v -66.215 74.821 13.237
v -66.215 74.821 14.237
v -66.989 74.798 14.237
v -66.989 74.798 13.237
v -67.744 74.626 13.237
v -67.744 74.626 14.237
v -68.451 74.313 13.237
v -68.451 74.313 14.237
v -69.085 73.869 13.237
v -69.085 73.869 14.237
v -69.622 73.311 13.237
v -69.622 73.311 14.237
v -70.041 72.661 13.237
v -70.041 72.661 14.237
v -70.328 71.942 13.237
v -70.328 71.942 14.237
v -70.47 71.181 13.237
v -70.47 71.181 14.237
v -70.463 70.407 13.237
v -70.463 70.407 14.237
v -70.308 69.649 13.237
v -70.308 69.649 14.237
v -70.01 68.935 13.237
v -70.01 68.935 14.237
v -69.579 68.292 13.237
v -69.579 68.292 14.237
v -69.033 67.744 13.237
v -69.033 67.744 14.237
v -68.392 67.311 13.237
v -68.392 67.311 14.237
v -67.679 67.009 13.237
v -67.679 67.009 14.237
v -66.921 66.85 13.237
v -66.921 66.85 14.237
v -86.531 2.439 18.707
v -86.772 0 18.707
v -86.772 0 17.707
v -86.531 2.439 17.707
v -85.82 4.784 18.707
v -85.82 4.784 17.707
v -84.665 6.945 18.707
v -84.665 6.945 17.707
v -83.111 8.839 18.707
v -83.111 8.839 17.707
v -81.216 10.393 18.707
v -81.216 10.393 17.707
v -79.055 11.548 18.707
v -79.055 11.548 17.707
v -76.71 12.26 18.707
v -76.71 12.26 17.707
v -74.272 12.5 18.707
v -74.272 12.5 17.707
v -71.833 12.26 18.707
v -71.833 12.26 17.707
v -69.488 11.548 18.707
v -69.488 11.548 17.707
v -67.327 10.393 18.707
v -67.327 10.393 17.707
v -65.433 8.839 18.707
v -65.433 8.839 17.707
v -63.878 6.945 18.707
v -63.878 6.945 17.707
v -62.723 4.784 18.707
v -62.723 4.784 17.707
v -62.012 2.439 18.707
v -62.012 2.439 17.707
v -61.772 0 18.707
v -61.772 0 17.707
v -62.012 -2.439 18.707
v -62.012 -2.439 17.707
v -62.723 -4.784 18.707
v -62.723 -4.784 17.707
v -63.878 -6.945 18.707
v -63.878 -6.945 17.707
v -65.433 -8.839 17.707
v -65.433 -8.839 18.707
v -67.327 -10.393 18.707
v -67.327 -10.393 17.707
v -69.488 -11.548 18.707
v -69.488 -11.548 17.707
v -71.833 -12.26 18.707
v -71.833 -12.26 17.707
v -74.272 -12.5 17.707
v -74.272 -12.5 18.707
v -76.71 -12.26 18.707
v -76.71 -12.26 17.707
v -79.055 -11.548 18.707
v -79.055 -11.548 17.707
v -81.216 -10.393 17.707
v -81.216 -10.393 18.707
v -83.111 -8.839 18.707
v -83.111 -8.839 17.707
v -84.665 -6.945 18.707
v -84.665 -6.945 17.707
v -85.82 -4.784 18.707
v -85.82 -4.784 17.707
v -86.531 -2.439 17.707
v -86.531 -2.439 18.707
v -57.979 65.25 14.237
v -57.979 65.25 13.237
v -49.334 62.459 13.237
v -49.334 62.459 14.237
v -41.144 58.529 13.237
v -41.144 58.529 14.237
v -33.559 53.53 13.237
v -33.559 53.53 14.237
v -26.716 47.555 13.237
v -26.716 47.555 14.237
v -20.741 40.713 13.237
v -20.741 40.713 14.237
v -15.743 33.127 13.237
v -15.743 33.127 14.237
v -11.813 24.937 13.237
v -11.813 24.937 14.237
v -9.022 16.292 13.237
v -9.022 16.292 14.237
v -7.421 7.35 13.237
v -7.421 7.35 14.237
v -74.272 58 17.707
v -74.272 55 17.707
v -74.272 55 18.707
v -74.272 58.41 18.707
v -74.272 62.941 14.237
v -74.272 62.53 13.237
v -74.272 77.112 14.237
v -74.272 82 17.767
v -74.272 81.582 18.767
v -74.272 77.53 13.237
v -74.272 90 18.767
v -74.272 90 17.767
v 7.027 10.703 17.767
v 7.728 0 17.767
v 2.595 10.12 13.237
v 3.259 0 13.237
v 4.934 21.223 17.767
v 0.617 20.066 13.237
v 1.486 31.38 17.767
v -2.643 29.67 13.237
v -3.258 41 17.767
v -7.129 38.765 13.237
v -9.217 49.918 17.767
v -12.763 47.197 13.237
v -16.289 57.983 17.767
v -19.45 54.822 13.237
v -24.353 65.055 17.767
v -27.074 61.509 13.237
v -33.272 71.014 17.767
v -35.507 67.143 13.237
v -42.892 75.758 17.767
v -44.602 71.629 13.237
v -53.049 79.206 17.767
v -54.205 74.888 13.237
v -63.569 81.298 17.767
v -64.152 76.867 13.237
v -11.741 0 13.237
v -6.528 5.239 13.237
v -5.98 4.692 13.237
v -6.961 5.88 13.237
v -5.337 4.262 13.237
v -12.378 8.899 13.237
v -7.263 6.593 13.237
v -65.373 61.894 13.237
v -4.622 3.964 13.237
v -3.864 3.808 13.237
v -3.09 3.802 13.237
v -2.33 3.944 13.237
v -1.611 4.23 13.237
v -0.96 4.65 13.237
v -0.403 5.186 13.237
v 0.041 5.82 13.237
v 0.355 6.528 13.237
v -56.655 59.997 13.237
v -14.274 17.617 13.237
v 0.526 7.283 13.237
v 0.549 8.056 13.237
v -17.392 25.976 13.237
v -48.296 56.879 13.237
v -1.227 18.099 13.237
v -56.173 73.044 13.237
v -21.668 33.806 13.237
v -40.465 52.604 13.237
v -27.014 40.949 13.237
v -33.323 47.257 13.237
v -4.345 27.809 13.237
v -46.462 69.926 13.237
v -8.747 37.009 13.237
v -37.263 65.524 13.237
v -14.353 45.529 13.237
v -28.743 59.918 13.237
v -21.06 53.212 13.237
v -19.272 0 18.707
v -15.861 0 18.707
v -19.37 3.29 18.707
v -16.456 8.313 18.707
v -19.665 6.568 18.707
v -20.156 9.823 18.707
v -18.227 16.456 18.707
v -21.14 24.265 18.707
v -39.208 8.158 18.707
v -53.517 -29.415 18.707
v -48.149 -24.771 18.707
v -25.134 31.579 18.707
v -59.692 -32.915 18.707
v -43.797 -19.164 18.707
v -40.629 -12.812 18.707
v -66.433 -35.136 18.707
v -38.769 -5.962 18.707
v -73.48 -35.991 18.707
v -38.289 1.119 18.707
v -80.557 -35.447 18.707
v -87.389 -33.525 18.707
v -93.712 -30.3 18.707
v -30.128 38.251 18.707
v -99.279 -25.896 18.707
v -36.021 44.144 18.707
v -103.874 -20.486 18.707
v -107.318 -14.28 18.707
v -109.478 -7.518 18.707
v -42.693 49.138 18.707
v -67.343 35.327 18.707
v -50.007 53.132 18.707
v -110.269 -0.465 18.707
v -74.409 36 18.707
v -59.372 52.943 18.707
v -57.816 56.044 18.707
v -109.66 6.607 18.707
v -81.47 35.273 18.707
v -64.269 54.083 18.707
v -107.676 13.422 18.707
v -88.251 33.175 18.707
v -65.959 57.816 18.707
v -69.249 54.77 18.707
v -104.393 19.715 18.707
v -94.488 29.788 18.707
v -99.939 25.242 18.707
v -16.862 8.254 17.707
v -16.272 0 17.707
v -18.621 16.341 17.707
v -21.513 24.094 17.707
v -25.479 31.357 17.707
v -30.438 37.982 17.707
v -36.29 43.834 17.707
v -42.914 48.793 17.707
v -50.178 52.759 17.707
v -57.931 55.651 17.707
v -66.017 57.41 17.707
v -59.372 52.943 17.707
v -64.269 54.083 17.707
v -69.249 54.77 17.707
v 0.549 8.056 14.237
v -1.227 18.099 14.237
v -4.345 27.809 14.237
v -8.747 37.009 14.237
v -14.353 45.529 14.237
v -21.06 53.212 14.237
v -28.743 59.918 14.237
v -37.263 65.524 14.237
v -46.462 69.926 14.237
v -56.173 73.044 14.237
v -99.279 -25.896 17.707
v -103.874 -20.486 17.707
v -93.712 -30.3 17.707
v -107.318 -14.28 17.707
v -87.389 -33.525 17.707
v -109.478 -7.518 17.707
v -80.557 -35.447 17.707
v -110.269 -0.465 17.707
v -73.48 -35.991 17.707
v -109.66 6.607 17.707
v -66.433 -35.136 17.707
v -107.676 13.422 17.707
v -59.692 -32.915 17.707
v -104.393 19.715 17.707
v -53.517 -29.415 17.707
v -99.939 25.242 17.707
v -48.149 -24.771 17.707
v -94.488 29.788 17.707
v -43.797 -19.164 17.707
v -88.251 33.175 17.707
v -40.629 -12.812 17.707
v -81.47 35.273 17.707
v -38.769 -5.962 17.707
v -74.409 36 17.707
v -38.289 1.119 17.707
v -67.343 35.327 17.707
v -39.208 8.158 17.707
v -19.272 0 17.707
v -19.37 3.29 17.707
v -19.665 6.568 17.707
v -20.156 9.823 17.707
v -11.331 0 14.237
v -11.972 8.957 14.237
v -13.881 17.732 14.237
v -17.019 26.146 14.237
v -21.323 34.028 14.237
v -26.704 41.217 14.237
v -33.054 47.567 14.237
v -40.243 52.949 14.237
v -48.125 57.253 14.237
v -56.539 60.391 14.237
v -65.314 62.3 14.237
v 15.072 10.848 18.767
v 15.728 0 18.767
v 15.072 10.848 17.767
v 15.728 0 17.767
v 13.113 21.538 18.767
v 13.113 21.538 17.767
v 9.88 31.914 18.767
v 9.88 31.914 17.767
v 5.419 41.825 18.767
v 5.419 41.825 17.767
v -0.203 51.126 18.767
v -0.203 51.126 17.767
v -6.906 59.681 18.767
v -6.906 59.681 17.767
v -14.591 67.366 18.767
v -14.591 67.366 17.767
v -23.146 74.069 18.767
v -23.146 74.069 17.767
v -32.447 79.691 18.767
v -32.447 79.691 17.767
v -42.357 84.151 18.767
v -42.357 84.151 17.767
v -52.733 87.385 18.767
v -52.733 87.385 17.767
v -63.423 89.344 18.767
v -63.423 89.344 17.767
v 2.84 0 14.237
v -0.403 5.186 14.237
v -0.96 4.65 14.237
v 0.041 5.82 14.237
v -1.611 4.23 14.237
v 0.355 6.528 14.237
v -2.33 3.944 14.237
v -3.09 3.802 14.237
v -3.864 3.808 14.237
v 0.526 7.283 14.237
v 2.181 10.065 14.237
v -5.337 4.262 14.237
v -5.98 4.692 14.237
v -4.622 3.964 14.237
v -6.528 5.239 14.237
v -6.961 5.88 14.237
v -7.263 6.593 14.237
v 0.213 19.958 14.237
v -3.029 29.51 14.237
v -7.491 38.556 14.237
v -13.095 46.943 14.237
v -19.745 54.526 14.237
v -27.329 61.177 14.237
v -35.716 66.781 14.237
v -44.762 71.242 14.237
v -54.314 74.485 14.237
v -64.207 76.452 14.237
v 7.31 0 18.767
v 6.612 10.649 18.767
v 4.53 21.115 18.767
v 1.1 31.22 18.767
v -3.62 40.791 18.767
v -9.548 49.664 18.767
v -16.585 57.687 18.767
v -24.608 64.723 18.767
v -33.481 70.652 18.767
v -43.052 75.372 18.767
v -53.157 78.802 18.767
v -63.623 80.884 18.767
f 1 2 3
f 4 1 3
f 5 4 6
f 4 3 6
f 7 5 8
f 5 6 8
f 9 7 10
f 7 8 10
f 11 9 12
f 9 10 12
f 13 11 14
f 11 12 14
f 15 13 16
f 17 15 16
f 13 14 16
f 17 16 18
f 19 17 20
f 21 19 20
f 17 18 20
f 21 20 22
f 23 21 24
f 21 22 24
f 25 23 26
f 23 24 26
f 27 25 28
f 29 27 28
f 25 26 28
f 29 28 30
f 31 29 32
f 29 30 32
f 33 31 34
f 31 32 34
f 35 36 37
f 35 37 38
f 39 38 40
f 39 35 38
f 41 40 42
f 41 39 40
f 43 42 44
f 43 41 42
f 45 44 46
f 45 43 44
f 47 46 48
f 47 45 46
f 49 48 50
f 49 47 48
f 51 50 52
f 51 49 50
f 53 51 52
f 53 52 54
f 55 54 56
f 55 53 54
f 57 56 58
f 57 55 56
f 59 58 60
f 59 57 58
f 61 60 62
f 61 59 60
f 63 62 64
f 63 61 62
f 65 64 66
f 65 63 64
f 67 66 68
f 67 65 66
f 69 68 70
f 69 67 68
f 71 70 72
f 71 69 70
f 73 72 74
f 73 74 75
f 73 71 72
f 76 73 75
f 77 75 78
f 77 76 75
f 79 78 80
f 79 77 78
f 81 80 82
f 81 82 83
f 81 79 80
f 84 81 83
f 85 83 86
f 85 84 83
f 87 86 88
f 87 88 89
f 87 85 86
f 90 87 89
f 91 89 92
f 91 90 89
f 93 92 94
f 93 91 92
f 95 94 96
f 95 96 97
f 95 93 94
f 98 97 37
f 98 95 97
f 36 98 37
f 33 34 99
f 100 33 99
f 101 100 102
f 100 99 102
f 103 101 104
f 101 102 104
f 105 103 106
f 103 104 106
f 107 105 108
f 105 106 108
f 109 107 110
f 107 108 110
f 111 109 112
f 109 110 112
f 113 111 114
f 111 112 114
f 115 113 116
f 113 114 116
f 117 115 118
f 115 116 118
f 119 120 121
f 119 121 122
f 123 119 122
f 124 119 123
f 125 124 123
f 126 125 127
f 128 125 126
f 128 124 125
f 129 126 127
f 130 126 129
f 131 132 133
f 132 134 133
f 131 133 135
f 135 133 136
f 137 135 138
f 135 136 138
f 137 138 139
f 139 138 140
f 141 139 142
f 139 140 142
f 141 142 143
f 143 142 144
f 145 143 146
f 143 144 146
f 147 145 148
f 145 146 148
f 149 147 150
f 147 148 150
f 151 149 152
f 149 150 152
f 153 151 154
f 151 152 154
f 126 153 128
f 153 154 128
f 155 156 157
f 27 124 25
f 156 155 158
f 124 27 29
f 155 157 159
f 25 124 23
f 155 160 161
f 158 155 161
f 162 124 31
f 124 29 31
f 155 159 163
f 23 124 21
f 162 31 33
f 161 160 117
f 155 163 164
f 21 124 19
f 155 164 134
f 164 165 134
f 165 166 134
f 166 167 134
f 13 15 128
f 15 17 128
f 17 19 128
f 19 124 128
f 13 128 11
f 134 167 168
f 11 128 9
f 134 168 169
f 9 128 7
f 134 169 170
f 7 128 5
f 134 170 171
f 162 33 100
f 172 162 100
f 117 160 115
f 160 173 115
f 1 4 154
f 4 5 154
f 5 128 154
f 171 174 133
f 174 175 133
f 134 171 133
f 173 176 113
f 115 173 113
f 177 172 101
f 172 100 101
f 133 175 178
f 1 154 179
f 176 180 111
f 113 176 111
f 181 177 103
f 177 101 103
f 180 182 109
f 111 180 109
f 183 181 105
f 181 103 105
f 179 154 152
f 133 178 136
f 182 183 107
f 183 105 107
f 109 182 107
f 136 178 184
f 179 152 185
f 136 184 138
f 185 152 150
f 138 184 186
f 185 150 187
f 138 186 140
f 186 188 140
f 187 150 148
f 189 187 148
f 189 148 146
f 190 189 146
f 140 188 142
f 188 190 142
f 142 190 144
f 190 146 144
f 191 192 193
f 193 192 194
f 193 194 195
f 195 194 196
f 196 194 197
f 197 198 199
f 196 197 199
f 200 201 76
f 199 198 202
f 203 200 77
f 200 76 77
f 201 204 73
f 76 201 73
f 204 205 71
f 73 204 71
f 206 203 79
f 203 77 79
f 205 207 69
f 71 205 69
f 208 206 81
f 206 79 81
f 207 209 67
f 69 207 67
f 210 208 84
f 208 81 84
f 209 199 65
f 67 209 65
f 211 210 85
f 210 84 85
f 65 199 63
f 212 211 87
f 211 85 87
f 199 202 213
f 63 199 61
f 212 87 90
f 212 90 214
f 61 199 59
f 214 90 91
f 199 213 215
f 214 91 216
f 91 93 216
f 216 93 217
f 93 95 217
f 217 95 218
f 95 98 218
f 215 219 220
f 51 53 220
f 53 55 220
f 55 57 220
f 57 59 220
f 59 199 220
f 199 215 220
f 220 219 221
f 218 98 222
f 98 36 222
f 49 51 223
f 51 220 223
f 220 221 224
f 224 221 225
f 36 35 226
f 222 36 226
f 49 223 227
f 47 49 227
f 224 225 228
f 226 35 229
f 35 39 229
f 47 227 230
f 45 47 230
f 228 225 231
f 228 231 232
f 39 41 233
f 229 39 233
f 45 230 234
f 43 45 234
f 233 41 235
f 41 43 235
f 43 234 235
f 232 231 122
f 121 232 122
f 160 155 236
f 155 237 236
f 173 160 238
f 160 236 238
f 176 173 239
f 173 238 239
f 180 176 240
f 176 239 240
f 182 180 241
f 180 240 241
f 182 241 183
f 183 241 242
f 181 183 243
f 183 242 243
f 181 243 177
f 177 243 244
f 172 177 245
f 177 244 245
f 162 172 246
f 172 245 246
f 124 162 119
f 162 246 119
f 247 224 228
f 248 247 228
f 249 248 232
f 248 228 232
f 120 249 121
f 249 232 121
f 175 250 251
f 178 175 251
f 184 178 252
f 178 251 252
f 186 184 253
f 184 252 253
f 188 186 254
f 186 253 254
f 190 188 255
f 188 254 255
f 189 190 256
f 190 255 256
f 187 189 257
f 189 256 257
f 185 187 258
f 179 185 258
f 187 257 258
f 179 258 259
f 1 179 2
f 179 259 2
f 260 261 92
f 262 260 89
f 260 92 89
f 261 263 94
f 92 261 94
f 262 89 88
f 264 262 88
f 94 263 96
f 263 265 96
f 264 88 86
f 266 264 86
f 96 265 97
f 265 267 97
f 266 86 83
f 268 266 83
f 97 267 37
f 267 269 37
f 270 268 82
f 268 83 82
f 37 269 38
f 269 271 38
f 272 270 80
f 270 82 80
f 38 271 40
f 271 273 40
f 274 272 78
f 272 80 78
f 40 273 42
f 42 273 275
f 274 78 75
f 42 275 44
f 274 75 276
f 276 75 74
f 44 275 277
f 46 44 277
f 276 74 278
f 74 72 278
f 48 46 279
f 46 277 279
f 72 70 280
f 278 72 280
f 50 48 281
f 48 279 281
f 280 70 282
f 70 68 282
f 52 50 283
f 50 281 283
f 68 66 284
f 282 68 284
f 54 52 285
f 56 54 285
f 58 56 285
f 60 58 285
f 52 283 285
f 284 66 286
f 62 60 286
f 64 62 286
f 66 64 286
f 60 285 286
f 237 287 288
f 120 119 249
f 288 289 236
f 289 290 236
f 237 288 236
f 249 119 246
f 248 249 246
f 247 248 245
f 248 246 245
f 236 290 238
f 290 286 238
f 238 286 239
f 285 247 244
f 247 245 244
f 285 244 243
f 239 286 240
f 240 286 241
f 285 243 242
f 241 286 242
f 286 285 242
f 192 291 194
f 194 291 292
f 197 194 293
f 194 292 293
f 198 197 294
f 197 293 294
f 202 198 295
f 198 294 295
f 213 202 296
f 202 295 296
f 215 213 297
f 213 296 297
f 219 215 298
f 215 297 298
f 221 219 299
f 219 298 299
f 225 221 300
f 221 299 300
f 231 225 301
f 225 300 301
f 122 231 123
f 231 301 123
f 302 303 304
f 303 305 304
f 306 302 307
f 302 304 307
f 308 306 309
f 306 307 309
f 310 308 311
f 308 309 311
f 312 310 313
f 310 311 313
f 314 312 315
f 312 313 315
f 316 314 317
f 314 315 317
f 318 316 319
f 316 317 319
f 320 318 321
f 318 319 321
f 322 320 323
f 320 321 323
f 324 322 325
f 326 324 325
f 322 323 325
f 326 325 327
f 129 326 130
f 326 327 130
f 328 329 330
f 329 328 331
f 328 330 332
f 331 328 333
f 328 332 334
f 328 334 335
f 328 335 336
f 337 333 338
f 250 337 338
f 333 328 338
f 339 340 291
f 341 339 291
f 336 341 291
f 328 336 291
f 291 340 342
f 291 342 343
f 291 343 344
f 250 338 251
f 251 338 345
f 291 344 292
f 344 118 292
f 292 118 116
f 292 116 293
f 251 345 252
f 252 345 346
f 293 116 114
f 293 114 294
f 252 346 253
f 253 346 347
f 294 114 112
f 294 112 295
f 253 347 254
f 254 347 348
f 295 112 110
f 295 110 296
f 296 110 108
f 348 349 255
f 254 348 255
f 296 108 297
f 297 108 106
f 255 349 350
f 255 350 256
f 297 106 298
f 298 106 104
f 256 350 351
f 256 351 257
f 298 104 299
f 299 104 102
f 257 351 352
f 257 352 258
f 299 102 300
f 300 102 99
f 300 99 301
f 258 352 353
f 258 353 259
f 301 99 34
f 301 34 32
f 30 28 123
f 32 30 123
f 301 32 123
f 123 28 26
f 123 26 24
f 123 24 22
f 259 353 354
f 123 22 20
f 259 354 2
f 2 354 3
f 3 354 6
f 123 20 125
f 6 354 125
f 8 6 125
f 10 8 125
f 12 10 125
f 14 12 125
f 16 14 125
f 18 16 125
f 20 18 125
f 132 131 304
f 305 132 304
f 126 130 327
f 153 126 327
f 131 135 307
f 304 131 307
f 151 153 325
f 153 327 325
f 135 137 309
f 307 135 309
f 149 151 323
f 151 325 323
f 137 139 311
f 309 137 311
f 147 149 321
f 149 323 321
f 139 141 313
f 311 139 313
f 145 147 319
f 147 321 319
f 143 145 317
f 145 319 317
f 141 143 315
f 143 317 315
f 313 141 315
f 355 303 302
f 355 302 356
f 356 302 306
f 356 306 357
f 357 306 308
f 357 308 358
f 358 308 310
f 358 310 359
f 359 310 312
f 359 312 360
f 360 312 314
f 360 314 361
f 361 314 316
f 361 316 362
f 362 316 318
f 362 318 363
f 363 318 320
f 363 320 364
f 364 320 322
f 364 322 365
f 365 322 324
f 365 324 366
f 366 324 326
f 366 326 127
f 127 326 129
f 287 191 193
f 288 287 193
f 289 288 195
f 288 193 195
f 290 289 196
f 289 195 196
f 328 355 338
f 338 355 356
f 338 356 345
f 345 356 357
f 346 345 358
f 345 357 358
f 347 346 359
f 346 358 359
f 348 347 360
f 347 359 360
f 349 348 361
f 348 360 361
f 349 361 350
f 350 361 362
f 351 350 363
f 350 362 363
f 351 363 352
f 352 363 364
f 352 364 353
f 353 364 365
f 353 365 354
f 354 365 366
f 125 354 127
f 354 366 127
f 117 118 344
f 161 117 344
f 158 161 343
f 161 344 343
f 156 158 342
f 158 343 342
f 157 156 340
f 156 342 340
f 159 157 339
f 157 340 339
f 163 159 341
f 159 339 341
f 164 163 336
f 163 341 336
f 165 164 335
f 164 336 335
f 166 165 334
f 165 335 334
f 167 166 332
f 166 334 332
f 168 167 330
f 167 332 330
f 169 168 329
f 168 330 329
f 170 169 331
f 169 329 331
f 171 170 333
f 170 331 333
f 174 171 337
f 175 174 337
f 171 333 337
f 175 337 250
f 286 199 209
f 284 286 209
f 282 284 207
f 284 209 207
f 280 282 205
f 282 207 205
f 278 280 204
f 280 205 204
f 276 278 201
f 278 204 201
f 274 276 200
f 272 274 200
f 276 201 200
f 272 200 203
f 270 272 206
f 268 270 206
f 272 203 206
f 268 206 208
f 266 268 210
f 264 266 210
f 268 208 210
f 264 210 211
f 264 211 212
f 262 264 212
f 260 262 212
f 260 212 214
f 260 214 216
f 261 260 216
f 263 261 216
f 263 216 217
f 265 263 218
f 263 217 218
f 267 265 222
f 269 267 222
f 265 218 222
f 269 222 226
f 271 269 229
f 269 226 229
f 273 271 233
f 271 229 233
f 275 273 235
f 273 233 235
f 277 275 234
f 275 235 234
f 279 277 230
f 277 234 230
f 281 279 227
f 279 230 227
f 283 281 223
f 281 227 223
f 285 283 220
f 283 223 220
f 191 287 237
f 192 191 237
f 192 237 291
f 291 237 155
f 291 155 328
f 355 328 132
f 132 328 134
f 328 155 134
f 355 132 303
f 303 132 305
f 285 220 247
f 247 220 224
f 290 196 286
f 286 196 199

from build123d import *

# Parameters (mm, degrees)
REVOLVE1_ANGLE          = 90
BOSS_EXTRUDE1_START     = -1
SKETCH2_R               = 12.5
BOSS_EXTRUDE1_DEPTH     = 1
CUT_EXTRUDE1_DEPTH      = 143.444465377
CUT_EXTRUDE1_DEPTH_BACK = 143.444465377


with BuildPart() as part:
    # Sketch1 → Revolve1 (revolve)
    with BuildSketch(Plane(origin=(0, 0, 0), x_dir=(1, 0, 0), z_dir=(0, 1, 0))):
        Polygon((-16.271625609, -17.706954757), (-19.271625609, -17.706954757), (-19.271625609, -18.706954757), (-15.861337675, -18.706954757), (-11.331165057, -14.237179487), (2.840396891, -14.237179487), (7.310172161, -18.767352105), (15.728322279, -18.767352105), (15.728322279, -17.767352105), (7.728322279, -17.767352105), (3.258547009, -13.237179487), (-11.741452991, -13.237179487), align=None)
    revolve(axis=Axis((-74.271677721, 0, 17.706954757), (0, 0, 1)), revolution_arc=REVOLVE1_ANGLE)

    # Sketch2 → Boss-Extrude1 (add)
    with BuildSketch(Plane(origin=(0, 0, 17.706954757), x_dir=(-1, 0, 0), z_dir=(0, 0, -1)).offset(BOSS_EXTRUDE1_START)):
        with BuildLine():
            Line((67.342979074, 35.326946302), (59.371742963, 52.943344025))
            ThreePointArc((59.371742963, 52.943344025), (33.582268097, 37.005103388), (20.15595474, 9.823149116))
            Line((20.15595474, 9.823149116), (39.208104561, 8.157563191))
            ThreePointArc((39.208104561, 8.157563191), (99.279307908, -25.89630152), (67.342979074, 35.326946302))
        make_face()
        with Locations((74.271677721, 0)):
            Circle(SKETCH2_R, mode=Mode.SUBTRACT)
    extrude(amount=BOSS_EXTRUDE1_DEPTH)

    # Sketch3 → Cut-Extrude1 (cut, two sides: drawn at the far end of the back side and taken through both)
    with BuildSketch(Plane(origin=(0, 0, 13.237179487), x_dir=(-1, 0, 0), z_dir=(0, 0, -1)).offset(-CUT_EXTRUDE1_DEPTH_BACK)):
        with BuildLine():
            ThreePointArc((7.421193768, 7.350328837), (3.090443615, 3.801635214), (-0.54921214, 8.056224419))
            ThreePointArc((-0.54921214, 8.056224419), (21.059515993, 53.212161728), (66.215453303, 74.820889862))
            ThreePointArc((66.215453303, 74.820889862), (70.470042507, 71.181234106), (66.921348884, 66.850483953))
            ThreePointArc((66.921348884, 66.850483953), (26.716370243, 47.555307479), (7.421193768, 7.350328837))
        make_face()
    extrude(amount=CUT_EXTRUDE1_DEPTH + CUT_EXTRUDE1_DEPTH_BACK, mode=Mode.SUBTRACT)


solid = part.part
